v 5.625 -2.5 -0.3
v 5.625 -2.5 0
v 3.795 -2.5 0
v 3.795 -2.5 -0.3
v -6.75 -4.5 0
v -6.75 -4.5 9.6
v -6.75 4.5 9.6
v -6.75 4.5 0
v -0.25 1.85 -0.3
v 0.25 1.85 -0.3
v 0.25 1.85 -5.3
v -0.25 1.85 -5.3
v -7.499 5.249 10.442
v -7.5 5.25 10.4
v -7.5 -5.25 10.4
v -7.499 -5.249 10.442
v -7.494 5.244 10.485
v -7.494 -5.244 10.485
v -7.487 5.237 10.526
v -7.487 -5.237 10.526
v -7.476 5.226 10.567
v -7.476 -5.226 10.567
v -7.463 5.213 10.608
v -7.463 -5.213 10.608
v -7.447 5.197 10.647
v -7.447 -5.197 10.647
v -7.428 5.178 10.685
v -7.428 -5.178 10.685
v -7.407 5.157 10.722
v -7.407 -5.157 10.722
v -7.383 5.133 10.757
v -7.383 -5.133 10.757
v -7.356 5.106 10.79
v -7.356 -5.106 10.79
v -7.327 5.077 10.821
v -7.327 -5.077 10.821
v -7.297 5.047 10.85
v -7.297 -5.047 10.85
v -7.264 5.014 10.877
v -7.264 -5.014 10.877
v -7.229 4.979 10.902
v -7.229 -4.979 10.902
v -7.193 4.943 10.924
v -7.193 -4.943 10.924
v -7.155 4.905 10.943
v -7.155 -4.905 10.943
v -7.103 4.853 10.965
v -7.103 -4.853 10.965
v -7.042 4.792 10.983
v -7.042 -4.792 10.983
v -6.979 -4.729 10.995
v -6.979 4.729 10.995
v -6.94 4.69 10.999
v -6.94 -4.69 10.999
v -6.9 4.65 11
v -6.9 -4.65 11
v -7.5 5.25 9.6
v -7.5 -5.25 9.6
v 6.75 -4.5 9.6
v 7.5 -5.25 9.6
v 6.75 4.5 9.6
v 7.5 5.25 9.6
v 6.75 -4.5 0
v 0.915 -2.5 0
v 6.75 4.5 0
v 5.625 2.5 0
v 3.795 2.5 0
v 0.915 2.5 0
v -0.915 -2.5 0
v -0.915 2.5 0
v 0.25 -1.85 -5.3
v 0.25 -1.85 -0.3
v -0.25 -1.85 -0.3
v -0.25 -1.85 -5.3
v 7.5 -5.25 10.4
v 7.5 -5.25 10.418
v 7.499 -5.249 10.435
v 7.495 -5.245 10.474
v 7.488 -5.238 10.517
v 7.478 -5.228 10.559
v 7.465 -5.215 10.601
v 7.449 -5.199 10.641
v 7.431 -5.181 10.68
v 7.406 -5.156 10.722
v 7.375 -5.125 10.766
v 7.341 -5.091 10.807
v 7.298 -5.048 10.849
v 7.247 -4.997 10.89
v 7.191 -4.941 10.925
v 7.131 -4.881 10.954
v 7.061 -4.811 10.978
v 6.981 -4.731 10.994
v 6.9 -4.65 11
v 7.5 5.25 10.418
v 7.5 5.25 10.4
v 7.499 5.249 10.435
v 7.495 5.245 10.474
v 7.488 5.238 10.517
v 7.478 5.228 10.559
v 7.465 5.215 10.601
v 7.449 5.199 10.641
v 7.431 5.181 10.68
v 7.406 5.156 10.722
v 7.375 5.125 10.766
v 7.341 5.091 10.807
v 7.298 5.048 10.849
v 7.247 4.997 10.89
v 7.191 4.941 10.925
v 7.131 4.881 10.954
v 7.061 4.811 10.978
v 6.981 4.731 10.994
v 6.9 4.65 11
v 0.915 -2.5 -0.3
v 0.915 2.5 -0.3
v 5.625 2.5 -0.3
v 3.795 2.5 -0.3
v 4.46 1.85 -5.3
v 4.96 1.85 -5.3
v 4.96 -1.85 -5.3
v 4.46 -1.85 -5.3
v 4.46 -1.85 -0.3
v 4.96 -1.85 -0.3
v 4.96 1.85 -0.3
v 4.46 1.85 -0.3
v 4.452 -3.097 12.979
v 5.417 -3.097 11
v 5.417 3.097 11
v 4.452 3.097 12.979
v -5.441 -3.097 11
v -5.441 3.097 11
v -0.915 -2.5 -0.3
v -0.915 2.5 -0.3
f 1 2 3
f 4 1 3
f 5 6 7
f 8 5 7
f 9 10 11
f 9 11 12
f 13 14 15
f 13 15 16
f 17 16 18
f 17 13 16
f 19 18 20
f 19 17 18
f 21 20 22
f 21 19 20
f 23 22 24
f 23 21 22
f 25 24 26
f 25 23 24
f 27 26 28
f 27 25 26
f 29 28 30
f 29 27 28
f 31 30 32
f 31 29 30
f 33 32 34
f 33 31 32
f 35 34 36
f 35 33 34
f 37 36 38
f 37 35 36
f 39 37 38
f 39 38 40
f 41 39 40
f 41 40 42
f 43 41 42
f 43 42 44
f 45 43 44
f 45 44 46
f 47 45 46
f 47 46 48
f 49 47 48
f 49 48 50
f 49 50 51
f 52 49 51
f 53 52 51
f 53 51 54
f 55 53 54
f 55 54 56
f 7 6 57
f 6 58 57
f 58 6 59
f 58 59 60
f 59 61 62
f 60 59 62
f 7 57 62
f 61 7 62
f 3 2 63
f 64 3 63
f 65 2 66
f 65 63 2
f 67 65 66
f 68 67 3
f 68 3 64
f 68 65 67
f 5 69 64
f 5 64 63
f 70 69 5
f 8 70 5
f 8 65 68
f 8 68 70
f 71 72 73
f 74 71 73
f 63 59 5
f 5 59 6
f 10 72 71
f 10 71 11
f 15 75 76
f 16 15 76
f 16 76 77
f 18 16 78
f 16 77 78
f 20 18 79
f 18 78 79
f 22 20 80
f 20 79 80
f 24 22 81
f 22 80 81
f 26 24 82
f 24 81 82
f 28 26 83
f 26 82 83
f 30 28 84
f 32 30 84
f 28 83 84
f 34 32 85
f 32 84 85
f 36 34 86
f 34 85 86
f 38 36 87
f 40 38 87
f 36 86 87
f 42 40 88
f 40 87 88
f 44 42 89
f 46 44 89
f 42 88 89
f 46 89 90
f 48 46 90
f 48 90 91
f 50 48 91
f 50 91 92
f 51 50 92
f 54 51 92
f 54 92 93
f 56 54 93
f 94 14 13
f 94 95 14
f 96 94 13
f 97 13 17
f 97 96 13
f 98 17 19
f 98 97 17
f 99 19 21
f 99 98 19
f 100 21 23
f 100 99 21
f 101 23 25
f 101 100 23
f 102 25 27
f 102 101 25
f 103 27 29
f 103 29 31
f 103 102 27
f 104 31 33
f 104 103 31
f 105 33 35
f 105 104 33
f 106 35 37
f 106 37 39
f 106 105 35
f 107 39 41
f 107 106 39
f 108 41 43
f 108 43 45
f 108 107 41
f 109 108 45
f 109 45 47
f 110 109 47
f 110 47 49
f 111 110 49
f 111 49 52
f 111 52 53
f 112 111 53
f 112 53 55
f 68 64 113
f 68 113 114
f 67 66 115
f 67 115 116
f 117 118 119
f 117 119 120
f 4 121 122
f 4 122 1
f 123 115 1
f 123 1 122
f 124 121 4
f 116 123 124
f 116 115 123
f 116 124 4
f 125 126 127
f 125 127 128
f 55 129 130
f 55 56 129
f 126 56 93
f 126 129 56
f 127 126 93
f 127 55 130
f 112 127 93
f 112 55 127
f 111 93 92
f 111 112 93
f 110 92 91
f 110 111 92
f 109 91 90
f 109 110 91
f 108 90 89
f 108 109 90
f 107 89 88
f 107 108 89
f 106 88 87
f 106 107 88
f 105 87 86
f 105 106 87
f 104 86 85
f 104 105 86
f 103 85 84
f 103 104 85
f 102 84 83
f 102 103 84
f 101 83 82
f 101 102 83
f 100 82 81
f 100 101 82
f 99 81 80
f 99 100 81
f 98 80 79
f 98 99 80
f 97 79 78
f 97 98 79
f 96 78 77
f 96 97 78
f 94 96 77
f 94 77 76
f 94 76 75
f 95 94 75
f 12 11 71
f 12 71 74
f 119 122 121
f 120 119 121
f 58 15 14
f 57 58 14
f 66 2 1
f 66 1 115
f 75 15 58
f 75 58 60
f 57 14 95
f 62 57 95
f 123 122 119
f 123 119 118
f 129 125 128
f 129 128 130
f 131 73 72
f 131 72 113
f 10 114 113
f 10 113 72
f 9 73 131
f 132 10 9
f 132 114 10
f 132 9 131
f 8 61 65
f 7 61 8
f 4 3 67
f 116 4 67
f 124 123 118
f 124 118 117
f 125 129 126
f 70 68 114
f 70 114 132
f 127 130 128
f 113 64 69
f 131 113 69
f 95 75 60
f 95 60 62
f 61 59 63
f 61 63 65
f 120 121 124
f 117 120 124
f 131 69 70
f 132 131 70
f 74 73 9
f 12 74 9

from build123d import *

# Parameters (mm, degrees)
SKETCH_1_W      = 15
SKETCH_1_H      = 10.5
EXTRUDE_1_DEPTH = 1.4
EXTRUDE_2_DEPTH = 6.194784772
SKETCH_3_W      = 13.5
SKETCH_3_H      = 9
EXTRUDE_3_DEPTH = 9.6
SKETCH_4_W      = 1.830527318
SKETCH_4_H      = 5
EXTRUDE_4_DEPTH = 0.3
SKETCH_5_W      = 0.5
SKETCH_5_H      = 3.7
EXTRUDE_5_DEPTH = 5
SKETCH_6_W      = 1.830527318
SKETCH_6_H      = 5
EXTRUDE_6_DEPTH = 0.3
SKETCH_7_W      = 0.5
SKETCH_7_H      = 3.7
EXTRUDE_7_DEPTH = 5
DRAFT_1_ANGLE   = 26
FILLET_1_R      = 0.6


with BuildPart() as part:
    # 草图1 → 凸台-拉伸1 (new body)
    with BuildSketch(Plane.XY.offset(11)):
        Rectangle(SKETCH_1_W, SKETCH_1_H)
    extrude(amount=-EXTRUDE_1_DEPTH)

    # 草图2 → 凸台-拉伸2 (add)
    with BuildSketch(Plane.XZ.offset(3.097392386)):
        Polygon((5.416790428, 11), (5.416790428, 13.171623136), (-5.441325251, 11), align=None)
    extrude(amount=-EXTRUDE_2_DEPTH)

    # 草图3 → 凸台-拉伸3 (add)
    with BuildSketch(Plane(origin=(0, 0, 9.6), x_dir=(-1, 0, 0), z_dir=(0, 0, -1))):
        Rectangle(SKETCH_3_W, SKETCH_3_H)
    extrude(amount=EXTRUDE_3_DEPTH)

    # 草图4 → 凸台-拉伸4 (add)
    with BuildSketch(Plane(origin=(0, 0, 0), x_dir=(-1, 0, 0), z_dir=(0, 0, -1))):
        Rectangle(SKETCH_4_W, SKETCH_4_H)
    extrude(amount=EXTRUDE_4_DEPTH)

    # 草图5 → 凸台-拉伸5 (add)
    with BuildSketch(Plane(origin=(0, 0, -0.3), x_dir=(-1, 0, 0), z_dir=(0, 0, -1))):
        Rectangle(SKETCH_5_W, SKETCH_5_H)
    extrude(amount=EXTRUDE_5_DEPTH)

    # 草图6 → 凸台-拉伸6 (add)
    with BuildSketch(Plane(origin=(0, 0, 0), x_dir=(-1, 0, 0), z_dir=(0, 0, -1))):
        with Locations((-4.709769509, 0)):
            Rectangle(SKETCH_6_W, SKETCH_6_H)
    extrude(amount=EXTRUDE_6_DEPTH)

    # 草图7 → 凸台-拉伸7 (add)
    with BuildSketch(Plane(origin=(0, 0, -0.3), x_dir=(-1, 0, 0), z_dir=(0, 0, -1))):
        with Locations((-4.709769509, 0)):
            Rectangle(SKETCH_7_W, SKETCH_7_H)
    extrude(amount=EXTRUDE_7_DEPTH)

    # 拔模1
    draft_1_faces = [part.faces().sort_by_distance(p)[0] for p in [
        (5.416790428, 0, 12.085811568),
    ]]
    draft(draft_1_faces, Plane.XY.offset(11), DRAFT_1_ANGLE)

    # 圆角1
    fillet_1_edges = [part.edges().sort_by_distance(p)[0] for p in [
        (7.5, 0, 11),
        (0, -5.25, 11),
        (-7.5, 0, 11),
        (0, 5.25, 11),
    ]]
    fillet(fillet_1_edges, radius=FILLET_1_R)


solid = part.part
